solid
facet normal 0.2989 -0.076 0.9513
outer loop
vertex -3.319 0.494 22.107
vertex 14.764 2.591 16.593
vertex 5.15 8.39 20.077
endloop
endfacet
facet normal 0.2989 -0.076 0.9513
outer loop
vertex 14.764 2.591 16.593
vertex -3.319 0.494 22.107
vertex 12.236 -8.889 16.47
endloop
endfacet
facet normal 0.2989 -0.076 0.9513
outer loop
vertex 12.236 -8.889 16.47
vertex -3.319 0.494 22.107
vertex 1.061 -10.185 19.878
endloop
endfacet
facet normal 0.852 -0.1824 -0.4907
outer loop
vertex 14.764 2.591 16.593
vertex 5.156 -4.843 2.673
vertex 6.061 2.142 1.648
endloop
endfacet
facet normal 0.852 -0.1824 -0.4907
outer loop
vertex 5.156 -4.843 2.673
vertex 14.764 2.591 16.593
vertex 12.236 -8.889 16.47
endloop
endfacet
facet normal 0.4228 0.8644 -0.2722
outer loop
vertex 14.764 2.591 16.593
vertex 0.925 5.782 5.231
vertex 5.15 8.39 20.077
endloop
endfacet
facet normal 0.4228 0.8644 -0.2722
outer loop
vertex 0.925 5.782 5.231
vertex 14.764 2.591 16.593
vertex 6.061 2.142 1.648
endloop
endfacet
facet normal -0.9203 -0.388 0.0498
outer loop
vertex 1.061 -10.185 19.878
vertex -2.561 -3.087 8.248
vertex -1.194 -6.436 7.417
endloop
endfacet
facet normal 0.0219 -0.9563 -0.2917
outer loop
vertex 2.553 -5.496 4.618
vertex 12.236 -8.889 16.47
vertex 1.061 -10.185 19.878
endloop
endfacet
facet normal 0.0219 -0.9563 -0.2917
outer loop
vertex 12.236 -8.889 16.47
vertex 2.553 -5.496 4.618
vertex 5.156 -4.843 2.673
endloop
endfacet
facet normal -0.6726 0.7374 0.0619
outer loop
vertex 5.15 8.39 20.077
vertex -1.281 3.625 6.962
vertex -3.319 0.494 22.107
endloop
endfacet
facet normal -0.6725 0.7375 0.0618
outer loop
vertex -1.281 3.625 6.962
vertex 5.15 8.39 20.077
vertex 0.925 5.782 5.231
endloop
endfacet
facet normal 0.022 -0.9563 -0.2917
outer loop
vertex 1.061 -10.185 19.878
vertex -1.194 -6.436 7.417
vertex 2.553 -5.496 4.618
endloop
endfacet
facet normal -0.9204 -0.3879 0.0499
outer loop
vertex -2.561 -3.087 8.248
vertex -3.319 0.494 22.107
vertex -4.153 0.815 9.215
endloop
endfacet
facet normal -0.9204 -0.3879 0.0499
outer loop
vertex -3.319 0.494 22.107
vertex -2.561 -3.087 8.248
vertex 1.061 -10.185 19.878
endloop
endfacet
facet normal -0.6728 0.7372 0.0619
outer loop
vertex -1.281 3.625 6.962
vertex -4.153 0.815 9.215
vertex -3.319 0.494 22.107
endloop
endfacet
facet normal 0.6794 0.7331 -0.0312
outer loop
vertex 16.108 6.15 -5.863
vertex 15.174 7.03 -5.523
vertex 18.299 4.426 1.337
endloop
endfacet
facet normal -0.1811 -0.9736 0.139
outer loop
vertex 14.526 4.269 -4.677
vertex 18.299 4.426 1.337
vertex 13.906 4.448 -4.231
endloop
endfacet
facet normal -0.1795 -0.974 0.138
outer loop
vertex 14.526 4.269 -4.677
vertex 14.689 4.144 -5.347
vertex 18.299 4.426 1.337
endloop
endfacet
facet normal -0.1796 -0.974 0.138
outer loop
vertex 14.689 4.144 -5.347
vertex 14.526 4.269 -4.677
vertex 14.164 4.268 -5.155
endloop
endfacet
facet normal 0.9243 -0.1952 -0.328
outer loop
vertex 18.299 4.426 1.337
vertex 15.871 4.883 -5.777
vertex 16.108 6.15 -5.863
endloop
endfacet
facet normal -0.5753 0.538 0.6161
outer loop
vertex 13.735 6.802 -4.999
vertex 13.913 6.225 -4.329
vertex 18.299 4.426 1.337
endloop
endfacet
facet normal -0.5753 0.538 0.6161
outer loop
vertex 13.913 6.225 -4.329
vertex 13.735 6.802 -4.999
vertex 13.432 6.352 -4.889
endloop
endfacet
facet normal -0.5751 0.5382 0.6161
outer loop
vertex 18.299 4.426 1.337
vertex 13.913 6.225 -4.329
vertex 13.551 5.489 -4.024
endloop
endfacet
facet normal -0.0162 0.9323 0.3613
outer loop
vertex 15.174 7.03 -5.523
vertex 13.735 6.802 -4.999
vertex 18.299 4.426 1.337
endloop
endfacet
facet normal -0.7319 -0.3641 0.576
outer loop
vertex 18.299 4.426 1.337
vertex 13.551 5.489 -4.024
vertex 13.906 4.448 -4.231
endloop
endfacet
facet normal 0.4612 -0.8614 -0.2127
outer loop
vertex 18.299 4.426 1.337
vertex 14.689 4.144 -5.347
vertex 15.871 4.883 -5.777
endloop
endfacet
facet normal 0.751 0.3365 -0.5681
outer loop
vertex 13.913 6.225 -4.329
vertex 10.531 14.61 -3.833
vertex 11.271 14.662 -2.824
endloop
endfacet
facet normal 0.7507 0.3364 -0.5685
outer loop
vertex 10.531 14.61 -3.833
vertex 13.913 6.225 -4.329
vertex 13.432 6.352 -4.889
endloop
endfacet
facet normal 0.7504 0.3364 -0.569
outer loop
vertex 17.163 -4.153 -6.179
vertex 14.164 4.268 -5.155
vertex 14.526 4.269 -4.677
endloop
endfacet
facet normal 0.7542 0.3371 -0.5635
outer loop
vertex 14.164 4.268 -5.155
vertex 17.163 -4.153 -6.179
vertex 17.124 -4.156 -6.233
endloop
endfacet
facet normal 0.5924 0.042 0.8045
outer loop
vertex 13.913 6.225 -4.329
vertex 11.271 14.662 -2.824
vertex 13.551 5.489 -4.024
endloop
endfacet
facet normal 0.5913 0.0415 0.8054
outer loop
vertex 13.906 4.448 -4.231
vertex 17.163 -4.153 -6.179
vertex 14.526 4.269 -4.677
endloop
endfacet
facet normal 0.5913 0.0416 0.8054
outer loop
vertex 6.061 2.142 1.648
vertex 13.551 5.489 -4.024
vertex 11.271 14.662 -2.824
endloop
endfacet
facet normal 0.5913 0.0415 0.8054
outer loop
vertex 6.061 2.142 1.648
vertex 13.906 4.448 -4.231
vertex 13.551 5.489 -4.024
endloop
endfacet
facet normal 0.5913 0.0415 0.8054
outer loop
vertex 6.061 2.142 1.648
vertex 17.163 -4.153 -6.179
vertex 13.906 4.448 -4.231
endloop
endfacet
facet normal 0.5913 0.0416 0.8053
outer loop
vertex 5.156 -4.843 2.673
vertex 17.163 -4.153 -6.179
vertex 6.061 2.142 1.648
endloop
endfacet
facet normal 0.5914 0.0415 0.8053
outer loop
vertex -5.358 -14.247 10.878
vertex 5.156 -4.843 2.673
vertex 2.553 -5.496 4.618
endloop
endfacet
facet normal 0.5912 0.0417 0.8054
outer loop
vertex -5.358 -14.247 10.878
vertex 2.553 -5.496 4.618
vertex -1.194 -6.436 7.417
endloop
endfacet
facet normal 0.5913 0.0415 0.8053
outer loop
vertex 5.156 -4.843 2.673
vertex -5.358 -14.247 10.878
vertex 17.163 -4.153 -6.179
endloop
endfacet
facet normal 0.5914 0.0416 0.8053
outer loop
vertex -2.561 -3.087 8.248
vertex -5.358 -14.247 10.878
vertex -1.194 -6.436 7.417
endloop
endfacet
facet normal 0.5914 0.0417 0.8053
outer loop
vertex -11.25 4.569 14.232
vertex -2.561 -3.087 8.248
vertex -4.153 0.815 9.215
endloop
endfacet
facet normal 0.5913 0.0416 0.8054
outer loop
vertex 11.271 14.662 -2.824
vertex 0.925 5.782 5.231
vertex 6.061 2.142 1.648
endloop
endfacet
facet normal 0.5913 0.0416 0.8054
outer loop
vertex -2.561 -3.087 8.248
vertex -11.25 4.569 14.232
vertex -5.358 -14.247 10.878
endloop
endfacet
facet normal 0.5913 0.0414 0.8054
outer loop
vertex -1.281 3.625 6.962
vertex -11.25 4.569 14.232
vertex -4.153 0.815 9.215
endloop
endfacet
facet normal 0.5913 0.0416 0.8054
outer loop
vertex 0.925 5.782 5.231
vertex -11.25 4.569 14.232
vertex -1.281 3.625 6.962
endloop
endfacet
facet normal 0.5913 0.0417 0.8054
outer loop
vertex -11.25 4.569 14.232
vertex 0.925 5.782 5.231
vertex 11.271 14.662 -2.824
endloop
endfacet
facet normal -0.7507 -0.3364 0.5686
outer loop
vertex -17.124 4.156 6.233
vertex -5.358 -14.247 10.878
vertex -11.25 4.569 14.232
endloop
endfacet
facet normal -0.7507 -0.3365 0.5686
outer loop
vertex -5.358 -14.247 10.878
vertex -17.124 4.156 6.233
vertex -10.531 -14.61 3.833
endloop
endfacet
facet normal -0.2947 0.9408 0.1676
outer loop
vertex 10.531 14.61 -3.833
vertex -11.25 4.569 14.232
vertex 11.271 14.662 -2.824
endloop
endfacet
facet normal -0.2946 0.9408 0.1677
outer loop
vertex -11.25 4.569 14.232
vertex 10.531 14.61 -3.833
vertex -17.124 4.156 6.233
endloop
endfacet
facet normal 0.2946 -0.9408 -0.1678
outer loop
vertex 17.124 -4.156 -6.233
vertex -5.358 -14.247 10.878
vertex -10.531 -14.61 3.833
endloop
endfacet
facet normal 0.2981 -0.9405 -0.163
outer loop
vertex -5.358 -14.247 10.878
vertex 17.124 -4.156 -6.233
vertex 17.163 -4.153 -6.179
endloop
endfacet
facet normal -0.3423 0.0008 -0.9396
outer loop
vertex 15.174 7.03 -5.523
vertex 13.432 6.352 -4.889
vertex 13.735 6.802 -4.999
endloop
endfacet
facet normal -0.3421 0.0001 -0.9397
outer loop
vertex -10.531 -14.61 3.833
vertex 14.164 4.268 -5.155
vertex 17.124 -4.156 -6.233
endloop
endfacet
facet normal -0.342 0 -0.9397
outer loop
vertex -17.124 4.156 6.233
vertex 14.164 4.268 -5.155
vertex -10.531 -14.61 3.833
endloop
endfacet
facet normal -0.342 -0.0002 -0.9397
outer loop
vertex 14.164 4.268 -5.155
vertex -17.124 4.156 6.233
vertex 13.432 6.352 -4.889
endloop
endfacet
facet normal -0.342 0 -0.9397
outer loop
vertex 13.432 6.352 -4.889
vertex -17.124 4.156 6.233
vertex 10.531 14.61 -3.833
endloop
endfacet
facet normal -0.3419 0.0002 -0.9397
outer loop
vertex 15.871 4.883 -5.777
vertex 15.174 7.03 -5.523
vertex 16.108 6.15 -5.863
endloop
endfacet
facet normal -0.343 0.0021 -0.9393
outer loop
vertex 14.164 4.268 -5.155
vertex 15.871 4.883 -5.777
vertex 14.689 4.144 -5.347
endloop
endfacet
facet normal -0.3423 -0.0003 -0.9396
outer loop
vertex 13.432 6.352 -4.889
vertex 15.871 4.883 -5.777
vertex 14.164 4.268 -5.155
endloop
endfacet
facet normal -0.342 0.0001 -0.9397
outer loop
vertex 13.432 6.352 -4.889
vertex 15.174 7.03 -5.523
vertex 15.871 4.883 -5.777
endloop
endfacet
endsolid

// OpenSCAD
difference() {
    rotate([10,15,20]) {
        rotate(a = 5, v=[0,0,1000]) {
            cylinder(h = 20, d1 = 10, d2 = 20, $fn = 5);
        }
        scale([1.1, 0.9, 0.8]) {
            rotate(a = 10, v=[1000,1000,0]) {
                translate([15,0,-5]) {
                    cylinder(h = 30, d1 = 10, d2 = 0, $fn = 7, center=true);
                }
            }
        }
        rotate(a = 20, v=[0,1000,0]) {
            cube([30,20,10], center=true);
        }
    }
    rotate(a = 20, v=[0,1000,0]) {
        translate([0,0,-100]) {
            cube([200,200,200], center=true);
        }
    }
}
